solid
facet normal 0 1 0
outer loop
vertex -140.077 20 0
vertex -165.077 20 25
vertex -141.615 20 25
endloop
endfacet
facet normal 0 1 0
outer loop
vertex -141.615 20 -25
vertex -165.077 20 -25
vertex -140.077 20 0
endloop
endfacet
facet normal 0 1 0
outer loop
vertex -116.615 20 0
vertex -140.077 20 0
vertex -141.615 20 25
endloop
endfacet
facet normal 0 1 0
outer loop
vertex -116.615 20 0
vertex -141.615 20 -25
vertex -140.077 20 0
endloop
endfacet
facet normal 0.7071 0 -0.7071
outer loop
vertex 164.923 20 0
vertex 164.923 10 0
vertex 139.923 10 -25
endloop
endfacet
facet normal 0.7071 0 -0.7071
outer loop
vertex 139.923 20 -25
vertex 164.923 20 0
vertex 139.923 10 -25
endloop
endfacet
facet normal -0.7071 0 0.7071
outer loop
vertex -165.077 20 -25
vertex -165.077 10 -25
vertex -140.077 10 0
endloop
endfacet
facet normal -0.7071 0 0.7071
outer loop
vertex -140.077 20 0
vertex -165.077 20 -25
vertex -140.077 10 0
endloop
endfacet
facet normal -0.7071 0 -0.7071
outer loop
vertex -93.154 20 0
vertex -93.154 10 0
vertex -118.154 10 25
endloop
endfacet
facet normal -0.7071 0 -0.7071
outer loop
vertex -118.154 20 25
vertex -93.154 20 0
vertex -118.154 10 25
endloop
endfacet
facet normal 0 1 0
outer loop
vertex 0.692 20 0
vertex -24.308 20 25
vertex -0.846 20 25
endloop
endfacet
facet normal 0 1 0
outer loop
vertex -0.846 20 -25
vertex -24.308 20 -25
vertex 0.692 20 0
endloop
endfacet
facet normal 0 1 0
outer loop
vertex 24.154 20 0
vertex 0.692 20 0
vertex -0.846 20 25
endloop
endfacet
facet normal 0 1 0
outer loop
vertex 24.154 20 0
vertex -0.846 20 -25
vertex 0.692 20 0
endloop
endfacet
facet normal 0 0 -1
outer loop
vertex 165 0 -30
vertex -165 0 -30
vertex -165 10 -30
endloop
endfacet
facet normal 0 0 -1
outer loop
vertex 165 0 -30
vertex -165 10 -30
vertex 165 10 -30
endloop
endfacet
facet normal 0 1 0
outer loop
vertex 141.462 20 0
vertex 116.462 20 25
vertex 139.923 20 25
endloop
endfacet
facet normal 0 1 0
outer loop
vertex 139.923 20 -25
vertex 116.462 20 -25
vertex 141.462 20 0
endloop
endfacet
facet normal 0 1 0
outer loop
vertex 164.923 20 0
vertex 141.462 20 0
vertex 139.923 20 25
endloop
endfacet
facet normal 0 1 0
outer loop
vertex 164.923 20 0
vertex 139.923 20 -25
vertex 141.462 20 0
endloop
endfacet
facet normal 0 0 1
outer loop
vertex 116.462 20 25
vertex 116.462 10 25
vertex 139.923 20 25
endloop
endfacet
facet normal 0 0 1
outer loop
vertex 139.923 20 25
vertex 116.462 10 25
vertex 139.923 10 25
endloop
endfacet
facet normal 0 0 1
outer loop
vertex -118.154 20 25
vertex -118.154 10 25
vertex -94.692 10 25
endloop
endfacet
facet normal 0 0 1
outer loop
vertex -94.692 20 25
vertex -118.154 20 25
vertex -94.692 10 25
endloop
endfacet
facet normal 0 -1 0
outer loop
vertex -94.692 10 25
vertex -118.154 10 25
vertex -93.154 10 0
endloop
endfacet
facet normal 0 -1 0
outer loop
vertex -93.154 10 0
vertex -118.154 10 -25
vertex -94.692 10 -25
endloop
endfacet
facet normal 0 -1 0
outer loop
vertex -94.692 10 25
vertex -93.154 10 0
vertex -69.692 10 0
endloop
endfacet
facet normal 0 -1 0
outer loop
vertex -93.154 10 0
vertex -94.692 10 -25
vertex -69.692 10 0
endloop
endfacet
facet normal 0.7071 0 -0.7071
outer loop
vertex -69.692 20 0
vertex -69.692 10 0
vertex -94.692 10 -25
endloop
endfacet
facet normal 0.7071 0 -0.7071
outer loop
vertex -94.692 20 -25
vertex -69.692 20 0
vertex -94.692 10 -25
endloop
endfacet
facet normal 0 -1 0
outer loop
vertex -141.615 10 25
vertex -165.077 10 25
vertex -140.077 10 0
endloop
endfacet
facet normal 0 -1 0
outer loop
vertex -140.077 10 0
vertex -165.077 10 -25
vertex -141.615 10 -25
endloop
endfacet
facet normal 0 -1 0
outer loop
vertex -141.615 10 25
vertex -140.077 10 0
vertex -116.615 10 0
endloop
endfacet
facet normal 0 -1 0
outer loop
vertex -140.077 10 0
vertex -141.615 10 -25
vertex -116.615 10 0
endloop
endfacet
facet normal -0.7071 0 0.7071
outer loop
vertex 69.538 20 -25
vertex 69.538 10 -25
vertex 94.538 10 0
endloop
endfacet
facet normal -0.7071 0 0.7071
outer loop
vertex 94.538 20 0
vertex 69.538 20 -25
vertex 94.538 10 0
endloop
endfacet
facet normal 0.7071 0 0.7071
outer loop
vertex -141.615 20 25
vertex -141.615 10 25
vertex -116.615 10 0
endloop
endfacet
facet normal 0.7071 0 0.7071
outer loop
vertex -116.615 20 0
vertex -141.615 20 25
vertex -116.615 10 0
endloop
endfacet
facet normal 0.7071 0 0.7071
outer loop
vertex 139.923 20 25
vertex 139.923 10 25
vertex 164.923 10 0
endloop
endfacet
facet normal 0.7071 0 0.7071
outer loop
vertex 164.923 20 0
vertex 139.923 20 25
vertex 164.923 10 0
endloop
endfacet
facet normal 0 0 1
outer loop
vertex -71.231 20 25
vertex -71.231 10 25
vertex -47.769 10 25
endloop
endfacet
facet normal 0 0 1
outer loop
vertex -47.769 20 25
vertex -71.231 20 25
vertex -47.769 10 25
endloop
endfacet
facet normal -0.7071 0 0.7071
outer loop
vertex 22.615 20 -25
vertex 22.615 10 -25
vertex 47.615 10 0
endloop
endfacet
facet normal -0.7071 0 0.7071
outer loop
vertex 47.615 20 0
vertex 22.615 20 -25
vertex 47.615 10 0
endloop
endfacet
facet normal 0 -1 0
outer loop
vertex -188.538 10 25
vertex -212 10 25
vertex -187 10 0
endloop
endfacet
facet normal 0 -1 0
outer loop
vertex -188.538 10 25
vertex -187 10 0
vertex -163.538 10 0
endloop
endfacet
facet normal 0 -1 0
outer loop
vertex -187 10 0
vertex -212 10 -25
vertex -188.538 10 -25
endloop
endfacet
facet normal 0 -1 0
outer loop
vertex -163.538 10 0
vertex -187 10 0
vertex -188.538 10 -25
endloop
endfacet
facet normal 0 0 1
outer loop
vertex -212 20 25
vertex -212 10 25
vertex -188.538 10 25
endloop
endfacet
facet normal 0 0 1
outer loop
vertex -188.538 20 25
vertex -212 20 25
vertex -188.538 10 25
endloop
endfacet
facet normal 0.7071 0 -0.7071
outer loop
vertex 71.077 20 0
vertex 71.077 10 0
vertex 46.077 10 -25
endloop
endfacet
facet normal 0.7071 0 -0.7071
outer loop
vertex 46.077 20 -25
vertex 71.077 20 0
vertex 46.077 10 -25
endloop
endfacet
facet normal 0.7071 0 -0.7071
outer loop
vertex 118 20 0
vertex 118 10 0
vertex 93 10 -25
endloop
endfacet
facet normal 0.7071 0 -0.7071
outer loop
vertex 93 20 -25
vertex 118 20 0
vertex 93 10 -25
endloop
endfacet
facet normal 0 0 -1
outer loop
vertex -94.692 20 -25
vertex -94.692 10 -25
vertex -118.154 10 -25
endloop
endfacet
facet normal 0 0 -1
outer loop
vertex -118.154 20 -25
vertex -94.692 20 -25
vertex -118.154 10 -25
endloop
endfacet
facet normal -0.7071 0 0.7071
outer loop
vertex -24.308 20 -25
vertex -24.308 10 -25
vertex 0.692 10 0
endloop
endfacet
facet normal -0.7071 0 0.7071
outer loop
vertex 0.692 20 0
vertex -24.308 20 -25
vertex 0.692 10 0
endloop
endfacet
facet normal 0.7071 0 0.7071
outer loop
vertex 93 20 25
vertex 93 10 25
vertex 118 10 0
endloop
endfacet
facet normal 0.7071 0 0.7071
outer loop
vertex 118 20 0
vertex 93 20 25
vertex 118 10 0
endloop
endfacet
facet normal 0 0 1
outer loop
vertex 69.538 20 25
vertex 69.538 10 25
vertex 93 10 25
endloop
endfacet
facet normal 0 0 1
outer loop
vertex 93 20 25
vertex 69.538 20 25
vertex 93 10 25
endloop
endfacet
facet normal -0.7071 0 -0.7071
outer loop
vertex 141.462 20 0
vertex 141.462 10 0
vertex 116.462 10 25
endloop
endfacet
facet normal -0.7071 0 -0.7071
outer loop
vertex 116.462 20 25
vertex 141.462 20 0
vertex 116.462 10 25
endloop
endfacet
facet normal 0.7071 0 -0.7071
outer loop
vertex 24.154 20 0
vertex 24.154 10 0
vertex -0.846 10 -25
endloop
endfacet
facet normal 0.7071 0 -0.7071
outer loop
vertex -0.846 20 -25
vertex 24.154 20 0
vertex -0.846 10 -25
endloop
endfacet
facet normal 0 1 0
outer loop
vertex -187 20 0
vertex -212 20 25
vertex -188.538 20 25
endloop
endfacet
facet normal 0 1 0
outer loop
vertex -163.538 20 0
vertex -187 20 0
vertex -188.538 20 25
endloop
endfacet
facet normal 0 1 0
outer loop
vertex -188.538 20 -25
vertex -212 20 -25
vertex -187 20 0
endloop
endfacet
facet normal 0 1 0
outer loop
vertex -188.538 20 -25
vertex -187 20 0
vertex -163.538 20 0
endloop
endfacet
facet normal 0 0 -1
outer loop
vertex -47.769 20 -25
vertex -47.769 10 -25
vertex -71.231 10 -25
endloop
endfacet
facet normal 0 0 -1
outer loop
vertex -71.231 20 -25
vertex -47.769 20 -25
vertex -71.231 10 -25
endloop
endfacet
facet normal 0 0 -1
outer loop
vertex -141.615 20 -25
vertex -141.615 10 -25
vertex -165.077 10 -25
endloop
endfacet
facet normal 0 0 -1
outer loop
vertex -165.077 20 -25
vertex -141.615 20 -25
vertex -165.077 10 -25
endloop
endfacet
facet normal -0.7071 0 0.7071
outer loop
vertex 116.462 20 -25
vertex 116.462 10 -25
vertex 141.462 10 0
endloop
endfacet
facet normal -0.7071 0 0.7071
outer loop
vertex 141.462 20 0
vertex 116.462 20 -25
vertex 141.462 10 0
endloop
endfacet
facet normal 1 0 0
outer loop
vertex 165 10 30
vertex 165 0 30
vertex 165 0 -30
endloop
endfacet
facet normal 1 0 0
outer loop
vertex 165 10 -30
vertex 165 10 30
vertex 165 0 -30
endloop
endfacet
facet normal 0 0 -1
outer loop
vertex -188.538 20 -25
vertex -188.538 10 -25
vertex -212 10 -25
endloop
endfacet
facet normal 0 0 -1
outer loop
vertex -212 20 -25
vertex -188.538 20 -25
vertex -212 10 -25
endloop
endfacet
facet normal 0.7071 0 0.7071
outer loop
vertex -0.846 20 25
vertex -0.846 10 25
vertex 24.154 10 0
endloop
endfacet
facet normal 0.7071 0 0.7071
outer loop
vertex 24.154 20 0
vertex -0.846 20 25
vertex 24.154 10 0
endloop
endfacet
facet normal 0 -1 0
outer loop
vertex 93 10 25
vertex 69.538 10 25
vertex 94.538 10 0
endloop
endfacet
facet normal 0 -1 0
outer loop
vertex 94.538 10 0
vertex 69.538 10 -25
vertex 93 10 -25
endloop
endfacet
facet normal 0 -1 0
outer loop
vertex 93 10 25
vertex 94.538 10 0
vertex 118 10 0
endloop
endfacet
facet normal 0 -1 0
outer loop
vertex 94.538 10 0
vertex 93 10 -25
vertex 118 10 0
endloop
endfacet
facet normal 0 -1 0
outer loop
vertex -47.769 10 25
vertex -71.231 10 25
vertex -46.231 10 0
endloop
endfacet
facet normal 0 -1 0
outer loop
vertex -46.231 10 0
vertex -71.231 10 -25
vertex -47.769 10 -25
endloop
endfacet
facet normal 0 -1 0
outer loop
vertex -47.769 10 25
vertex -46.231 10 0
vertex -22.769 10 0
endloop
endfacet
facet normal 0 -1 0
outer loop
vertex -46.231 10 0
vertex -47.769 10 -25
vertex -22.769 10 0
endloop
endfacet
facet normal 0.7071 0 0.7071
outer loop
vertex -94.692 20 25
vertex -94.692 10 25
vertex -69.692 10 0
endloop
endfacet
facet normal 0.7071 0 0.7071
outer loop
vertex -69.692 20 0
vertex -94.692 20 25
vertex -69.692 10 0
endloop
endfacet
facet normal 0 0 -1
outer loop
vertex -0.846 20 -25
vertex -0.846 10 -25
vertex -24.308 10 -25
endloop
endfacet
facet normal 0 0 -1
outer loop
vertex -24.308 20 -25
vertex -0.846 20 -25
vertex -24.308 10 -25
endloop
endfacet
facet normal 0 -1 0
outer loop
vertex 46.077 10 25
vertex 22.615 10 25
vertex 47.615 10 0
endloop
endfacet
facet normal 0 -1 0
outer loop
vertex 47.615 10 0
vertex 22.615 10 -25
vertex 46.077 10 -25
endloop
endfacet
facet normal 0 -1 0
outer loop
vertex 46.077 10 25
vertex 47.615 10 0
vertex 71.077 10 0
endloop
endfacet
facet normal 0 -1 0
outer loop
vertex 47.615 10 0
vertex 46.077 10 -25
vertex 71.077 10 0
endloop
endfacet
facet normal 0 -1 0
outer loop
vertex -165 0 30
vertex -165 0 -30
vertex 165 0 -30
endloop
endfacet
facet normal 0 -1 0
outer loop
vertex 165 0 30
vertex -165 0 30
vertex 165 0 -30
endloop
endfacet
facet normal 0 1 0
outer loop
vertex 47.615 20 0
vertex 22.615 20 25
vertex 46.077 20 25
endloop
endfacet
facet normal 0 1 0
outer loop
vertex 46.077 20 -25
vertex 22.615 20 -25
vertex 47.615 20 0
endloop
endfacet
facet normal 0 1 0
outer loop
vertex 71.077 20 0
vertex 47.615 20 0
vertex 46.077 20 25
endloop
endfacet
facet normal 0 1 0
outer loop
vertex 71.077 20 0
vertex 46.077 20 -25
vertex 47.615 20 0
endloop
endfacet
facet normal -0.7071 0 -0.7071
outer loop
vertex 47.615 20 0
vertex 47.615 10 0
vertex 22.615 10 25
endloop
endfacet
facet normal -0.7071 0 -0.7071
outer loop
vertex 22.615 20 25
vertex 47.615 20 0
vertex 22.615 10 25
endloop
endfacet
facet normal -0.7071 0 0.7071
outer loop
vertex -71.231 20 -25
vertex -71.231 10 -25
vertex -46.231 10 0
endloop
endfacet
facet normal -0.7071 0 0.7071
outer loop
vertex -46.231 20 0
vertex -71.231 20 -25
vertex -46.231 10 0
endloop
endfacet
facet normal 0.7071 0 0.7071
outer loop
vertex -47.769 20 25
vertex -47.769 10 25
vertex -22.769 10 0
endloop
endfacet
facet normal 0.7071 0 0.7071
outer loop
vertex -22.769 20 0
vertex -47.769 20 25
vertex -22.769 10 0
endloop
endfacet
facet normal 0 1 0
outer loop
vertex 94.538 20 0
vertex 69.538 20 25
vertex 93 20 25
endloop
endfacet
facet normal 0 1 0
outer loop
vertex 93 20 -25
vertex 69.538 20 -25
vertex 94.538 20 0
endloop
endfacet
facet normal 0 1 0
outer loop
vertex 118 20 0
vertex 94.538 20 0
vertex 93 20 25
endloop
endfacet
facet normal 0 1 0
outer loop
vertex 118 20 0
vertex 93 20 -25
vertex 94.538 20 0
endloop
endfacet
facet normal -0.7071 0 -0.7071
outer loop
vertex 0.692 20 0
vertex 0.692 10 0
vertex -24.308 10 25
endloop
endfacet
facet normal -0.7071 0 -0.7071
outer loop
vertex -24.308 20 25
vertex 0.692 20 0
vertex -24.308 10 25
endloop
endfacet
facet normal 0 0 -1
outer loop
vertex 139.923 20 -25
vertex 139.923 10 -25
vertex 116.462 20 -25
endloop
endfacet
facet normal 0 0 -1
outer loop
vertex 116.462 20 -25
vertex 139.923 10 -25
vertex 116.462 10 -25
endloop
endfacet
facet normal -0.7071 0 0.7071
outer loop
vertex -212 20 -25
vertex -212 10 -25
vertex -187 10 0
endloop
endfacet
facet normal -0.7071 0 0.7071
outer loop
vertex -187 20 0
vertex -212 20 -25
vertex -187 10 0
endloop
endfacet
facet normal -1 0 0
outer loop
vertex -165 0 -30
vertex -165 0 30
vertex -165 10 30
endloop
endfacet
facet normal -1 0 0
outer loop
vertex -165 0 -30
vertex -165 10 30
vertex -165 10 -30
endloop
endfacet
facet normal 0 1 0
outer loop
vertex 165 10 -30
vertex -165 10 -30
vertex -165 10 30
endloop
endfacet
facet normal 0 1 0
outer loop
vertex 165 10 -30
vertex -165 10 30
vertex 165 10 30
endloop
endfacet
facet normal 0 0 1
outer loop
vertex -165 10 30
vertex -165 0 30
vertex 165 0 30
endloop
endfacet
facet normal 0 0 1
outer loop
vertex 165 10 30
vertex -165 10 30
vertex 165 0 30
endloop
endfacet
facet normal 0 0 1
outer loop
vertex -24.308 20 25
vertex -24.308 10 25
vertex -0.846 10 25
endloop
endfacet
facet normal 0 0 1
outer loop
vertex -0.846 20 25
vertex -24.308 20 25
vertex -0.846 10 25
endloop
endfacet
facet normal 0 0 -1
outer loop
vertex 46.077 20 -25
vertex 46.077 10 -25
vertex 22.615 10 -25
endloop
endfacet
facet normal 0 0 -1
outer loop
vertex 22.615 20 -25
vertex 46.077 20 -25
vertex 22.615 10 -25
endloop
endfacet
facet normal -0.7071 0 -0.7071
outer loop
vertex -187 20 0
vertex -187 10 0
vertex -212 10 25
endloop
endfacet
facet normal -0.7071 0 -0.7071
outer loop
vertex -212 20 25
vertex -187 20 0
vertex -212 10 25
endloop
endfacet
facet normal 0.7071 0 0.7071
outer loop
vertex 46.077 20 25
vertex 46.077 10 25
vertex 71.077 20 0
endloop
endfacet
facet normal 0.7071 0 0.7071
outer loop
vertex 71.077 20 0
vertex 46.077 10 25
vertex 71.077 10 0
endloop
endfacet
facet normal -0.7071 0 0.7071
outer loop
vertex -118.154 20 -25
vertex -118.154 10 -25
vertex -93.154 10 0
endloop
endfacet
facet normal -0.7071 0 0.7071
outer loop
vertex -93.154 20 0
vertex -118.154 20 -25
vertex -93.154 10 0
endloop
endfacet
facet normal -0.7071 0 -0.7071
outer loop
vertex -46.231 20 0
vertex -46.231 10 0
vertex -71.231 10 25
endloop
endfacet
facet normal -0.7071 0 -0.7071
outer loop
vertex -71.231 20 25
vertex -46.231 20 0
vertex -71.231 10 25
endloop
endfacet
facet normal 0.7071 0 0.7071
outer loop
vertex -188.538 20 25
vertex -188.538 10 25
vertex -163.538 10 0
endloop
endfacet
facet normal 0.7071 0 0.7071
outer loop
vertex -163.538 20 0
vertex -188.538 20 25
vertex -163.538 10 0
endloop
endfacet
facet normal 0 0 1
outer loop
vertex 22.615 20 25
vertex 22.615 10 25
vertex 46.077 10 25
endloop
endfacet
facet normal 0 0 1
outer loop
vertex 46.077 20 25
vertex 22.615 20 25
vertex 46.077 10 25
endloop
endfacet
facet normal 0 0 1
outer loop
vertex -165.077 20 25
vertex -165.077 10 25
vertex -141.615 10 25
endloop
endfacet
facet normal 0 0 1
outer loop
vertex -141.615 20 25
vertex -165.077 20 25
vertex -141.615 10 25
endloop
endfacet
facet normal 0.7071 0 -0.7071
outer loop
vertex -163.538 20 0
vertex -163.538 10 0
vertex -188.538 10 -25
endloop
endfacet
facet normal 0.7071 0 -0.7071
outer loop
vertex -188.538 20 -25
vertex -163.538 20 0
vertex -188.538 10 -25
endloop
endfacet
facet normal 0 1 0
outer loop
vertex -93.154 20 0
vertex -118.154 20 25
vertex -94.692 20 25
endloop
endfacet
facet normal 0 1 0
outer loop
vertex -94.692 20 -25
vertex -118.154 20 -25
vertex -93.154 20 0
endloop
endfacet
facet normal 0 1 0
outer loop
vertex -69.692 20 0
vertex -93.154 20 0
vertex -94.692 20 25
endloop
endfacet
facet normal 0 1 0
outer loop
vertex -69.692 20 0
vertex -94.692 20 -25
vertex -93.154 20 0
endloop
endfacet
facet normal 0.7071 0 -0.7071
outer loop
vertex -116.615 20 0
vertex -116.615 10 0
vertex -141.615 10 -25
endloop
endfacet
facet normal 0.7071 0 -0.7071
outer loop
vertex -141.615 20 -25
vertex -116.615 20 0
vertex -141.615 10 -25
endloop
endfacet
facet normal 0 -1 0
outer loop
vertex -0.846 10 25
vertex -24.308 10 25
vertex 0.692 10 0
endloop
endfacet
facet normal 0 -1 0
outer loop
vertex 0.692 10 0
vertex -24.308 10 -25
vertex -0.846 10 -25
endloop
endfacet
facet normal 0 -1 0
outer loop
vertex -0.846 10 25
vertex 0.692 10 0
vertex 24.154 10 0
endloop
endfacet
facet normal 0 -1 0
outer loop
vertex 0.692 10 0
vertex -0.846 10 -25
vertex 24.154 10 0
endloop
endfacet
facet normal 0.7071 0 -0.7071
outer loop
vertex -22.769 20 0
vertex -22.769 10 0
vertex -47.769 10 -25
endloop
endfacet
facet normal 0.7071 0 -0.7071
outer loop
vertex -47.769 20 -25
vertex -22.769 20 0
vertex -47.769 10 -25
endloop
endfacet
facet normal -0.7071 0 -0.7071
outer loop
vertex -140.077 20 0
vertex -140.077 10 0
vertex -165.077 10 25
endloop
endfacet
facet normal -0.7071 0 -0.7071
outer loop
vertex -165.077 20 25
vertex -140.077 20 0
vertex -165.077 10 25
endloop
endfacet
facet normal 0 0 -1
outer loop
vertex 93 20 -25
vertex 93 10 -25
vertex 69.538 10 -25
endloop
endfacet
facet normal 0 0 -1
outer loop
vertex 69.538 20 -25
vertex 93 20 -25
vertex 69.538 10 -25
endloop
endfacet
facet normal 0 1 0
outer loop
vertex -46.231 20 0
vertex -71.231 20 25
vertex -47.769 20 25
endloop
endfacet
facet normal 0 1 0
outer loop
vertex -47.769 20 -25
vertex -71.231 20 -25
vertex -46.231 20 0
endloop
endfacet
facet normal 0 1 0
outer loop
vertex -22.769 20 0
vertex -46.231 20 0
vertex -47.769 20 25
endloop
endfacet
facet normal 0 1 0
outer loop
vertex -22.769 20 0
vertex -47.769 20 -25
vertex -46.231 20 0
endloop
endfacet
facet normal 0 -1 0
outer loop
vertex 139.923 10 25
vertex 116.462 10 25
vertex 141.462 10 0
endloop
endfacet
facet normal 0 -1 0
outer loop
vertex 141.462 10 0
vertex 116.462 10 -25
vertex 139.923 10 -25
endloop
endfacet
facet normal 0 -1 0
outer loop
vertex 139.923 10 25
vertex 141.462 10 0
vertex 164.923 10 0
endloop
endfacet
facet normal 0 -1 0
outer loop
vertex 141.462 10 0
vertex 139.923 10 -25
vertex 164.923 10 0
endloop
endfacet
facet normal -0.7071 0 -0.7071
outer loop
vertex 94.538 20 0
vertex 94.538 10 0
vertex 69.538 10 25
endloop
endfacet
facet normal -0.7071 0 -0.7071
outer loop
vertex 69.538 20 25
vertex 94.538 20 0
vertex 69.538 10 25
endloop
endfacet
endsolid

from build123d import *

# Parameters (mm, degrees)
SKETCH1_W             = 330
SKETCH1_H             = 60
BOSS_EXTRUDE1_DEPTH   = 10
BOSS_EXTRUDE2_DEPTH   = 10
BOSS_EXTRUDE2_2_DEPTH = 10
BOSS_EXTRUDE2_3_DEPTH = 10
BOSS_EXTRUDE2_4_DEPTH = 10
BOSS_EXTRUDE2_5_DEPTH = 10
BOSS_EXTRUDE2_6_DEPTH = 10
BOSS_EXTRUDE2_7_DEPTH = 10
BOSS_EXTRUDE2_8_DEPTH = 10


with BuildPart() as part:
    # Sketch1 → Boss-Extrude1 (new body)
    with BuildSketch(Plane(origin=(0, 0, 0), x_dir=(1, 0, 0), z_dir=(0, 1, 0))):
        Rectangle(SKETCH1_W, SKETCH1_H)
    extrude(amount=BOSS_EXTRUDE1_DEPTH)


with BuildPart() as body_2:
    # Sketch2 → Boss-Extrude2 (new body)
    with BuildSketch(Plane(origin=(0, 10, 0), x_dir=(1, 0, 0), z_dir=(0, 1, 0))):
        Polygon((-212, 25), (-187, 0), (-212, -25), (-188.538461538, -25), (-163.538461538, 0), (-188.538461538, 25), align=None)
    extrude(amount=BOSS_EXTRUDE2_DEPTH)


with BuildPart() as body_3:
    # Sketch2 → Boss-Extrude2 2 (new body)
    with BuildSketch(Plane(origin=(0, 10, 0), x_dir=(1, 0, 0), z_dir=(0, 1, 0))):
        Polygon((-141.615384615, 25), (-165.076923077, 25), (-140.076923077, 0), (-165.076923077, -25), (-141.615384615, -25), (-116.615384615, 0), align=None)
    extrude(amount=BOSS_EXTRUDE2_2_DEPTH)


with BuildPart() as body_4:
    # Sketch2 → Boss-Extrude2 3 (new body)
    with BuildSketch(Plane(origin=(0, 10, 0), x_dir=(1, 0, 0), z_dir=(0, 1, 0))):
        Polygon((-94.692307692, 25), (-118.153846154, 25), (-93.153846154, 0), (-118.153846154, -25), (-94.692307692, -25), (-69.692307692, 0), align=None)
    extrude(amount=BOSS_EXTRUDE2_3_DEPTH)


with BuildPart() as body_5:
    # Sketch2 → Boss-Extrude2 4 (new body)
    with BuildSketch(Plane(origin=(0, 10, 0), x_dir=(1, 0, 0), z_dir=(0, 1, 0))):
        Polygon((-47.769230769, 25), (-71.230769231, 25), (-46.230769231, 0), (-71.230769231, -25), (-47.769230769, -25), (-22.769230769, 0), align=None)
    extrude(amount=BOSS_EXTRUDE2_4_DEPTH)


with BuildPart() as body_6:
    # Sketch2 → Boss-Extrude2 5 (new body)
    with BuildSketch(Plane(origin=(0, 10, 0), x_dir=(1, 0, 0), z_dir=(0, 1, 0))):
        Polygon((-0.846153846, 25), (-24.307692308, 25), (0.692307692, 0), (-24.307692308, -25), (-0.846153846, -25), (24.153846154, 0), align=None)
    extrude(amount=BOSS_EXTRUDE2_5_DEPTH)


with BuildPart() as body_7:
    # Sketch2 → Boss-Extrude2 6 (new body)
    with BuildSketch(Plane(origin=(0, 10, 0), x_dir=(1, 0, 0), z_dir=(0, 1, 0))):
        Polygon((46.076923077, 25), (22.615384615, 25), (47.615384615, 0), (22.615384615, -25), (46.076923077, -25), (71.076923077, 0), align=None)
    extrude(amount=BOSS_EXTRUDE2_6_DEPTH)


with BuildPart() as body_8:
    # Sketch2 → Boss-Extrude2 7 (new body)
    with BuildSketch(Plane(origin=(0, 10, 0), x_dir=(1, 0, 0), z_dir=(0, 1, 0))):
        Polygon((93, 25), (69.538461538, 25), (94.538461538, 0), (69.538461538, -25), (93, -25), (118, 0), align=None)
    extrude(amount=BOSS_EXTRUDE2_7_DEPTH)


with BuildPart() as body_9:
    # Sketch2 → Boss-Extrude2 8 (new body)
    with BuildSketch(Plane(origin=(0, 10, 0), x_dir=(1, 0, 0), z_dir=(0, 1, 0))):
        Polygon((139.923076923, 25), (116.461538462, 25), (141.461538462, 0), (116.461538462, -25), (139.923076923, -25), (164.923076923, 0), align=None)
    extrude(amount=BOSS_EXTRUDE2_8_DEPTH)


solid = Compound([part.part, body_2.part, body_3.part, body_4.part, body_5.part, body_6.part, body_7.part, body_8.part, body_9.part])
